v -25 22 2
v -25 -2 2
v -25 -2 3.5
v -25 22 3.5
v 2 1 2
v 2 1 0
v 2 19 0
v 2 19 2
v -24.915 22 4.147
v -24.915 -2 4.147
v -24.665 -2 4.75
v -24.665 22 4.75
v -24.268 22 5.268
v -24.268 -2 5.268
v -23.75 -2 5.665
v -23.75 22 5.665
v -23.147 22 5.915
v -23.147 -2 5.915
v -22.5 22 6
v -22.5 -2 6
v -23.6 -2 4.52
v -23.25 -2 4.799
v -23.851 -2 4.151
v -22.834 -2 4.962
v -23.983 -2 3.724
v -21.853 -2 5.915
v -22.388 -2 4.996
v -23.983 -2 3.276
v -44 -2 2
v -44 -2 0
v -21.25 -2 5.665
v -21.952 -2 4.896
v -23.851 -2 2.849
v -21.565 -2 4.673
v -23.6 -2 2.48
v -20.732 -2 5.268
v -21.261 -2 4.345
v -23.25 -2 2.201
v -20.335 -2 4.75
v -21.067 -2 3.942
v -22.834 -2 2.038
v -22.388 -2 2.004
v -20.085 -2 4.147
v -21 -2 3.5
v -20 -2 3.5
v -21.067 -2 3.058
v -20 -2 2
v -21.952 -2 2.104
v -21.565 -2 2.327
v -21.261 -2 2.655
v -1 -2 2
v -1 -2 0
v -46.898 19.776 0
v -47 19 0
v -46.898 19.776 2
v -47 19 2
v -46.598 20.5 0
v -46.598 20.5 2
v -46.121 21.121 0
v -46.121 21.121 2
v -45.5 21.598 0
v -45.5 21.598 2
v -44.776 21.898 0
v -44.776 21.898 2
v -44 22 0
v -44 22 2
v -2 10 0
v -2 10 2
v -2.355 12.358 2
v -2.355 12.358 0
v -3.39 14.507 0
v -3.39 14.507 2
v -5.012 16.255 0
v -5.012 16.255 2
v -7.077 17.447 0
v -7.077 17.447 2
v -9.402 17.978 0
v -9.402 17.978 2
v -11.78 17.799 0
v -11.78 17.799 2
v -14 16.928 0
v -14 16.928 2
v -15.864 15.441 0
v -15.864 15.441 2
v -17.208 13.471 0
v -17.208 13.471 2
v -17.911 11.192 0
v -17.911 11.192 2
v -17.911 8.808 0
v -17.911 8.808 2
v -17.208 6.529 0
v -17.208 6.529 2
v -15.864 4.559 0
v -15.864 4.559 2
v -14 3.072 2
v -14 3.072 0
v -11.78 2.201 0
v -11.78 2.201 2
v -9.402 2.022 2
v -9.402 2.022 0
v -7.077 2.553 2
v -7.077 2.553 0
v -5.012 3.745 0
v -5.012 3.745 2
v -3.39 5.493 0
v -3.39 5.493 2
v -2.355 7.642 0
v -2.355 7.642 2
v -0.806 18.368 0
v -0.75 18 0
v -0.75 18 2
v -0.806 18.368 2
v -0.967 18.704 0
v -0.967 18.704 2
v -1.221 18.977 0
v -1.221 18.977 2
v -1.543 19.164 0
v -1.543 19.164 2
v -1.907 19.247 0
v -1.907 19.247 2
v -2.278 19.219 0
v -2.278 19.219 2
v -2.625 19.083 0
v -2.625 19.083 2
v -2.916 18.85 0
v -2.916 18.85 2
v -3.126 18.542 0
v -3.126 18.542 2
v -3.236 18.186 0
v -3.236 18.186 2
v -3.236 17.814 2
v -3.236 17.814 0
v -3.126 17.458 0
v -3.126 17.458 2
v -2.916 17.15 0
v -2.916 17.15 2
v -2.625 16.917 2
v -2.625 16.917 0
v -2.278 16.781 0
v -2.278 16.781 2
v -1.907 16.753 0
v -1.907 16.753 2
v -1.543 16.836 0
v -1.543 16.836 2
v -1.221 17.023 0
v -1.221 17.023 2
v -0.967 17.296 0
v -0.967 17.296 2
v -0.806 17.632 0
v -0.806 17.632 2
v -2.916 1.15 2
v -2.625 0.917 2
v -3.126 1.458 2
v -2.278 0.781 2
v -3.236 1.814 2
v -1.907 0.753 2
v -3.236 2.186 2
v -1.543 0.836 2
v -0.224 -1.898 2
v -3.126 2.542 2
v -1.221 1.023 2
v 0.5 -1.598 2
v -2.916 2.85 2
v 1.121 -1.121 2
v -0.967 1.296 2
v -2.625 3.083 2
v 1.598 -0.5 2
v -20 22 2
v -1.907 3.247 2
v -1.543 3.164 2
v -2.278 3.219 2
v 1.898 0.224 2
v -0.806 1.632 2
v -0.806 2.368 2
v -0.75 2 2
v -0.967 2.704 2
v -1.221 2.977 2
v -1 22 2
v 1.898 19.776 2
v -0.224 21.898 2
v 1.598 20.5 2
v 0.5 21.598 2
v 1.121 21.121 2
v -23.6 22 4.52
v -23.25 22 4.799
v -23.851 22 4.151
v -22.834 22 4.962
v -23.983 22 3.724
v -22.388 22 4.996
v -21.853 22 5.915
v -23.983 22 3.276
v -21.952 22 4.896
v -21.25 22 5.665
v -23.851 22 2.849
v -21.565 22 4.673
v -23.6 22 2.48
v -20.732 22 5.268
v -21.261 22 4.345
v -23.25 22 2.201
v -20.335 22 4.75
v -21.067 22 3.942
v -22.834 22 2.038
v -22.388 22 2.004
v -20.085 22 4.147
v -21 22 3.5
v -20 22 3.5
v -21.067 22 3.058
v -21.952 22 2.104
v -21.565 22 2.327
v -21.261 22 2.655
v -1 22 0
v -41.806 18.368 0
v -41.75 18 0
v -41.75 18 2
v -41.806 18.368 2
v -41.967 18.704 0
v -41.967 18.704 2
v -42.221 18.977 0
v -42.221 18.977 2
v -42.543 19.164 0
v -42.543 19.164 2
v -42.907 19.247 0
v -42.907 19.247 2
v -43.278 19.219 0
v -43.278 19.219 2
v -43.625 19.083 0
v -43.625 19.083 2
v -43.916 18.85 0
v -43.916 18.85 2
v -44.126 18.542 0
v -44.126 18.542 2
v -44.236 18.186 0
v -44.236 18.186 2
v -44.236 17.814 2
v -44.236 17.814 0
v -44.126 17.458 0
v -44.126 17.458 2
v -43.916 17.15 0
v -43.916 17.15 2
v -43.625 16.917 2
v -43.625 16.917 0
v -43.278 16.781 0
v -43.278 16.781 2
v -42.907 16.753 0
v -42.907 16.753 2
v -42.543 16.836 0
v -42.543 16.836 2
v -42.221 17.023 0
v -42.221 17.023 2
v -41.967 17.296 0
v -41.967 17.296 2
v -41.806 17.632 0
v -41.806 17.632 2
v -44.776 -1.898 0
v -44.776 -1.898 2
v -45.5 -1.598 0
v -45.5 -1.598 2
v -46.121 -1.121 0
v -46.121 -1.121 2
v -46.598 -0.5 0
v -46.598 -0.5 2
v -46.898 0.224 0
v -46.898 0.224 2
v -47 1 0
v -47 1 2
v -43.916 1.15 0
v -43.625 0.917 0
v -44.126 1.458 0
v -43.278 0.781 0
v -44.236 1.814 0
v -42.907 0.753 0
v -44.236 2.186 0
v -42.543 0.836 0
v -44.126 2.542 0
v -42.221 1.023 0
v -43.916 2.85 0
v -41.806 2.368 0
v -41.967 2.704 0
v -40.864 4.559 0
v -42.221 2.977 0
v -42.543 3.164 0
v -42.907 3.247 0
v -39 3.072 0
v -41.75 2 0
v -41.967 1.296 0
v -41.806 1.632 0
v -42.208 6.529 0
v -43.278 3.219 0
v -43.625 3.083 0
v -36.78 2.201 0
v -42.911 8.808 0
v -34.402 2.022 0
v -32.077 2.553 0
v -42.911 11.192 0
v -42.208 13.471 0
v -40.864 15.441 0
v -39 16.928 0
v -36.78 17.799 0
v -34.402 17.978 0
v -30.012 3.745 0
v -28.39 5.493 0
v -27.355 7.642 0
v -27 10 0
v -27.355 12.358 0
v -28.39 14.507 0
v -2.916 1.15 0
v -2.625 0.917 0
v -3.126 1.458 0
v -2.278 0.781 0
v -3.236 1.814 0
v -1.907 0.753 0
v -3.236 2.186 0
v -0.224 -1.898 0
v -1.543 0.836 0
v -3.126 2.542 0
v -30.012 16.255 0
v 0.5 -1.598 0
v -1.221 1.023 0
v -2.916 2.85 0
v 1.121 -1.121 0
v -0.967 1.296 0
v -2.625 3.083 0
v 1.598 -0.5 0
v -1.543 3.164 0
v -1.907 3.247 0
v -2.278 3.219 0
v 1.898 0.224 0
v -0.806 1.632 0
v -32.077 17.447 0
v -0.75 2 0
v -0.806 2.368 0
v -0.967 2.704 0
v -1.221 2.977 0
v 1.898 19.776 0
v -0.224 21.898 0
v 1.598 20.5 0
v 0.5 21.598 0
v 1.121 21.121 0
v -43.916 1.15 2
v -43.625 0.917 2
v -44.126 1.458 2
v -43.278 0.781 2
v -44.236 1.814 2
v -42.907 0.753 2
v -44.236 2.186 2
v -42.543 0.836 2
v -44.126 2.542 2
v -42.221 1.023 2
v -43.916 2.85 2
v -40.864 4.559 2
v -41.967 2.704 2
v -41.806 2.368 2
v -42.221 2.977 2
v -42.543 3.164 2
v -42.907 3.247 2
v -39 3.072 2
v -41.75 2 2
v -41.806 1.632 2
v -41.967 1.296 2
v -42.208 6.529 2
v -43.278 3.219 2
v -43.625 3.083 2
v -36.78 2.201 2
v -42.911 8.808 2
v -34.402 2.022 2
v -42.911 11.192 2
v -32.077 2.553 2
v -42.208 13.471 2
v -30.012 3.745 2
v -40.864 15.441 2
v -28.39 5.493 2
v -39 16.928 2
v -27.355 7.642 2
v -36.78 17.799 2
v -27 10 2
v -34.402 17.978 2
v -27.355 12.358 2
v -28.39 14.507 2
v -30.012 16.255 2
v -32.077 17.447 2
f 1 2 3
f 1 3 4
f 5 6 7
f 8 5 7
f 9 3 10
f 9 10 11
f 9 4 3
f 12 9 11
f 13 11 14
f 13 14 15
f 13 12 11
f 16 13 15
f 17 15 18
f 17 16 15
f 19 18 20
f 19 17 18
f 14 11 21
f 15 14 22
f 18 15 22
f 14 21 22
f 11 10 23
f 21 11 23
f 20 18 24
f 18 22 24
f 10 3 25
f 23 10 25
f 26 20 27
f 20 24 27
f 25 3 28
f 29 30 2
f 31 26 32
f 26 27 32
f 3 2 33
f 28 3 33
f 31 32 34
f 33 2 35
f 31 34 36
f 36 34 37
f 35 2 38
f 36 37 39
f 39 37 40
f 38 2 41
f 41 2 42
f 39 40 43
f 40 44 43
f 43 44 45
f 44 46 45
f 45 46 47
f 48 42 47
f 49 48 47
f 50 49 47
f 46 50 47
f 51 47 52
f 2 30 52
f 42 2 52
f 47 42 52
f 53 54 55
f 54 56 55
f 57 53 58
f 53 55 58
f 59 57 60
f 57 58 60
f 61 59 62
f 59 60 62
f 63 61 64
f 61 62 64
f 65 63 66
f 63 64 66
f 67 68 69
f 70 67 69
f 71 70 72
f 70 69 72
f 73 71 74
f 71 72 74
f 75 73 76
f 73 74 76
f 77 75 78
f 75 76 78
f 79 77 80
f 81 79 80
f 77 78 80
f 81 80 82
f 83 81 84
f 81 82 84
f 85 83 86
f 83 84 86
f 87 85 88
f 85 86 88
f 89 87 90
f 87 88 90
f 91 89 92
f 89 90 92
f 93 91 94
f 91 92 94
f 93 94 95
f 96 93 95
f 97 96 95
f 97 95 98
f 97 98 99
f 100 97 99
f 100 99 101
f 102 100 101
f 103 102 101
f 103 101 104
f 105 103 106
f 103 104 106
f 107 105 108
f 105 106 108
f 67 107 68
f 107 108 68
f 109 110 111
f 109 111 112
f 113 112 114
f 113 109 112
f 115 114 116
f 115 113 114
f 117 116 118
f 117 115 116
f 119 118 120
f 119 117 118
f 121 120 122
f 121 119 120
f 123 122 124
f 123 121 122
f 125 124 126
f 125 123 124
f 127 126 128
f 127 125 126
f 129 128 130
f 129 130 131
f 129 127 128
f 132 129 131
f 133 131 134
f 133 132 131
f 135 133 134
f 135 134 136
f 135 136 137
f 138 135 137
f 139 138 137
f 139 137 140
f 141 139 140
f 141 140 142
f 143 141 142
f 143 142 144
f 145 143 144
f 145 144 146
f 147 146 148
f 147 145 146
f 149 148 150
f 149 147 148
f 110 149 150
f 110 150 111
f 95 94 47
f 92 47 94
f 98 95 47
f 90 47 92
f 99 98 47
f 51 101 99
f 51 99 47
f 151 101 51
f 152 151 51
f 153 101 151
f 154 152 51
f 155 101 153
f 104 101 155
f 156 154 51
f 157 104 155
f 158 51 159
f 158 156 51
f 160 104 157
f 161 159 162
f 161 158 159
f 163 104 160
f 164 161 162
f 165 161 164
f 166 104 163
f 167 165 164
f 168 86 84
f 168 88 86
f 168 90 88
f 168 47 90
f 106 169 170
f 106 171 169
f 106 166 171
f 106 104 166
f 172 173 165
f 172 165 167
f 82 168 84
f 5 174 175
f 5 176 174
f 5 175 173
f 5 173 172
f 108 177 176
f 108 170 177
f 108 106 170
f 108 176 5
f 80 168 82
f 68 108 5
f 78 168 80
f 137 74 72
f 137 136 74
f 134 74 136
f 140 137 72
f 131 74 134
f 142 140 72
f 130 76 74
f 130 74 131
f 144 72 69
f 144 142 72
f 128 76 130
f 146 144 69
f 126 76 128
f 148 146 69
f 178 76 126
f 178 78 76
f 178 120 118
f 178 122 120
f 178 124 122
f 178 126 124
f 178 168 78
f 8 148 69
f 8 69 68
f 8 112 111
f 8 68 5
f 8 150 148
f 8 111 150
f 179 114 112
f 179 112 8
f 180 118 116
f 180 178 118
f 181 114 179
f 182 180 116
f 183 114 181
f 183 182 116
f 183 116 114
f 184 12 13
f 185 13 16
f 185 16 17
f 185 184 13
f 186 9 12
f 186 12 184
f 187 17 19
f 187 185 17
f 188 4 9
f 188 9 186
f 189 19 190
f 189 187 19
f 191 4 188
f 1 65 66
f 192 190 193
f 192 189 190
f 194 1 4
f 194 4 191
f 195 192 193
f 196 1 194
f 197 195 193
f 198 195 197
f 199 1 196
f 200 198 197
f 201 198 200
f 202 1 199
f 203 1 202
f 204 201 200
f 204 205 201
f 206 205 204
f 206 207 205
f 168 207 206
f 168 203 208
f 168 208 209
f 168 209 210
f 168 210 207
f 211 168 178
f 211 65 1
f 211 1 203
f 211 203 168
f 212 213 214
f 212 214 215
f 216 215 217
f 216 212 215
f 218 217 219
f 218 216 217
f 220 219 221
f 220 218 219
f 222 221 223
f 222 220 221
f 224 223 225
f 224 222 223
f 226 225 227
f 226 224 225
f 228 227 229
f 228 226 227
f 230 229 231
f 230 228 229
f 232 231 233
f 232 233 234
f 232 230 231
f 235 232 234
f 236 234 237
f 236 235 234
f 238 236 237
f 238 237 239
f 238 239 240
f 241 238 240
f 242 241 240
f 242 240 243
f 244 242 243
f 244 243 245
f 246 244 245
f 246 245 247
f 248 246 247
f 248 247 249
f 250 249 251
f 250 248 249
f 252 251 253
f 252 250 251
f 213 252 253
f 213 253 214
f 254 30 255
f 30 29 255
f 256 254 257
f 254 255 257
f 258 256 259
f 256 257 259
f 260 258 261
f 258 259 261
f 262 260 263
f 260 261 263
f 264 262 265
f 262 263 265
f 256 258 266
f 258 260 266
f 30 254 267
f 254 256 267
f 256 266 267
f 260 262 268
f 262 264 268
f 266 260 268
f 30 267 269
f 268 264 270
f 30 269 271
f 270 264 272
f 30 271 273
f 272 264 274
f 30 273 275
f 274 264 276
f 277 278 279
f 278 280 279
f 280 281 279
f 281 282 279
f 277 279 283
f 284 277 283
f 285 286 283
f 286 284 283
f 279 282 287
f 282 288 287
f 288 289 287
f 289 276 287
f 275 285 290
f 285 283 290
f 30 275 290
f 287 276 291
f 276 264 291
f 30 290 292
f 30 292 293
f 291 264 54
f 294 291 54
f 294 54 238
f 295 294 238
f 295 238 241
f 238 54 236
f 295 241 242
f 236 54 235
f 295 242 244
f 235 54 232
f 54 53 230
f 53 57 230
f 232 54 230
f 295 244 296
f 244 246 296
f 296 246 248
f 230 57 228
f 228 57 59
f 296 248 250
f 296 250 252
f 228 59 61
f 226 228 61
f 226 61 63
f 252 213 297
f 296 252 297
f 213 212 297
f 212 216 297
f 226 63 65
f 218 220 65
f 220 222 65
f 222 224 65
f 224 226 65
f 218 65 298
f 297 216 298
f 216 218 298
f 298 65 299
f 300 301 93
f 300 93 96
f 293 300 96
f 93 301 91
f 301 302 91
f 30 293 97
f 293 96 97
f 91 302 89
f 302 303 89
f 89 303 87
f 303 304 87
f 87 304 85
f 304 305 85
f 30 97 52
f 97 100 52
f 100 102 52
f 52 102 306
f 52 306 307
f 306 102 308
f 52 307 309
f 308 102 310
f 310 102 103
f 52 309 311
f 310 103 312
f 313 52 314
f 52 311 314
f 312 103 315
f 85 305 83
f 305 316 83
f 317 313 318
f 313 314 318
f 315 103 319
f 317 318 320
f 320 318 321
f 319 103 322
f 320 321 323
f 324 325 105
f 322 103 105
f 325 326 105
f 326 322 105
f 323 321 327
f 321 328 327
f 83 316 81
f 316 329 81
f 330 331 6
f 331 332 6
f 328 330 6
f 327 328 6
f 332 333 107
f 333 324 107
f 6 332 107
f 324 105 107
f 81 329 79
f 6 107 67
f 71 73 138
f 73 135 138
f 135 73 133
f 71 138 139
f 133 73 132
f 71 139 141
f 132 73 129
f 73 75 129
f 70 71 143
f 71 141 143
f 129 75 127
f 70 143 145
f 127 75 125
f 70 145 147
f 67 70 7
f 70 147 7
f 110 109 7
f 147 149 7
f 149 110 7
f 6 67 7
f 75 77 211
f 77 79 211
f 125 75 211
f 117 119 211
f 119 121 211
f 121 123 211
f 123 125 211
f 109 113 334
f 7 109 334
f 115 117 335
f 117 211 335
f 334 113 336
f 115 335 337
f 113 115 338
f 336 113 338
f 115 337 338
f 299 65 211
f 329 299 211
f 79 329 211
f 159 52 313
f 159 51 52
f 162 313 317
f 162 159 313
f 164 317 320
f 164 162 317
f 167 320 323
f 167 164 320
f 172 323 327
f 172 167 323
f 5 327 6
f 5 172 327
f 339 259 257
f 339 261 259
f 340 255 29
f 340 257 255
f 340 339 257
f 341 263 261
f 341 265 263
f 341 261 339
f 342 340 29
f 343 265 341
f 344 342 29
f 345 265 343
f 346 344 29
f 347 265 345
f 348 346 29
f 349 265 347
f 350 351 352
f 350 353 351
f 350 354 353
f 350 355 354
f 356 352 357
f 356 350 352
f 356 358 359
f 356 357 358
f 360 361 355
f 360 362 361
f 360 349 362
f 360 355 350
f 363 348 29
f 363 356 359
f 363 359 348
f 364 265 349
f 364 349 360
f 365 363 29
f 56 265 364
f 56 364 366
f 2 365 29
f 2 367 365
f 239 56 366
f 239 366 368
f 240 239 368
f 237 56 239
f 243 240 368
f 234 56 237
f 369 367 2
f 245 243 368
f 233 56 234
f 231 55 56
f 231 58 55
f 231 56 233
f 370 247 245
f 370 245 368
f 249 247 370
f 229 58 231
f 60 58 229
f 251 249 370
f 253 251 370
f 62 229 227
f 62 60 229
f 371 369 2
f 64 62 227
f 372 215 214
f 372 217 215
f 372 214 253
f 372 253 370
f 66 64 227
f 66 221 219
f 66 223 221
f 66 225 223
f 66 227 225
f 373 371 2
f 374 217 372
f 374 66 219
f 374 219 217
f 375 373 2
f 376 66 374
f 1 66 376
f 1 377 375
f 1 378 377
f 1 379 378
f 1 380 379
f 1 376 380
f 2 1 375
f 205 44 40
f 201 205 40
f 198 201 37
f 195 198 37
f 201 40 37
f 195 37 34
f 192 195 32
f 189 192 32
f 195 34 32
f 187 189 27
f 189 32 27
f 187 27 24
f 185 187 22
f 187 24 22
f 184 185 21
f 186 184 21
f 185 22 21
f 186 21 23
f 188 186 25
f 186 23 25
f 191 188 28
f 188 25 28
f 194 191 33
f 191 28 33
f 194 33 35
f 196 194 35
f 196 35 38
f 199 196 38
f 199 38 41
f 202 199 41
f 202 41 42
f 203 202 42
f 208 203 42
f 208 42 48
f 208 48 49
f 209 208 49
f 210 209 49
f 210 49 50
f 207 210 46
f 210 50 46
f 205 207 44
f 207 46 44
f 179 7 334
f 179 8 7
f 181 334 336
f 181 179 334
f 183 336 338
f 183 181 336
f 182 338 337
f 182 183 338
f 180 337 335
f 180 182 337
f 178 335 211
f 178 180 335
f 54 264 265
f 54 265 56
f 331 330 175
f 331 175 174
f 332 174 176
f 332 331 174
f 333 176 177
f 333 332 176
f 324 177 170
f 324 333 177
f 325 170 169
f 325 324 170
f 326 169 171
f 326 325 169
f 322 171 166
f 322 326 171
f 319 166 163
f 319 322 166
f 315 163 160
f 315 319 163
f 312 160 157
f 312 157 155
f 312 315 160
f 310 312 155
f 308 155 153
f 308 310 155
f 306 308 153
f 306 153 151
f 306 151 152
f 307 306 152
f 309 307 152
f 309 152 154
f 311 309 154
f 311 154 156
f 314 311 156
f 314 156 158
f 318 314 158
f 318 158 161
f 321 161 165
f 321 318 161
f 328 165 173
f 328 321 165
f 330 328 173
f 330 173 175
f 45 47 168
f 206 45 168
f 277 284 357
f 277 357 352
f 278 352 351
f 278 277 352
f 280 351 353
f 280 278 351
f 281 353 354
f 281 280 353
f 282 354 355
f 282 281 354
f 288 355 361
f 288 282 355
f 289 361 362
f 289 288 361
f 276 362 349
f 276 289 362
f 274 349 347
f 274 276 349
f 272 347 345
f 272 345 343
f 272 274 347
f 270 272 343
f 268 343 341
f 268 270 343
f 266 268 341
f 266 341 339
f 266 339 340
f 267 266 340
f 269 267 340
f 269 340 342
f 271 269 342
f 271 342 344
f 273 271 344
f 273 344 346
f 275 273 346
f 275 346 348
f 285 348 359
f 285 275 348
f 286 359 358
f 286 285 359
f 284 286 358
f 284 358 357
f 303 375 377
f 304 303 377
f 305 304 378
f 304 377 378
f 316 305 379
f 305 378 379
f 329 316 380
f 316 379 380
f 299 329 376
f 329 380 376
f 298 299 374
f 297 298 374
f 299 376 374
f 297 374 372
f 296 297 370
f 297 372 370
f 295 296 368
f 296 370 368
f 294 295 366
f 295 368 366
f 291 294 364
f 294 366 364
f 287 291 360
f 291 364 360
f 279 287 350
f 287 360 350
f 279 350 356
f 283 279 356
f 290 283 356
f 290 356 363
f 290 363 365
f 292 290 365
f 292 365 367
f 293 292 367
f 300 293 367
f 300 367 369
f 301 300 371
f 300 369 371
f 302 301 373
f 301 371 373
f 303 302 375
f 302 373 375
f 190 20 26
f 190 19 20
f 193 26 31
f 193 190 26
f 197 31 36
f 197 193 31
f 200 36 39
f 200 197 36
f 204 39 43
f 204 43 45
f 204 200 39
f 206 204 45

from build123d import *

# Parameters (mm, degrees)
F1_W      = 49
F1_H      = 24
F1_R      = 1.25
F2_DEPTH  = 2
F3_W      = 5
F3_H      = 24
F4_DEPTH  = 4
F5_R      = 1.5
F6_DEPTH  = 24
F7_R      = 2.49999
F8_R      = 3
F9_R      = 8
F10_DEPTH = 2


# Not quite as in the source:
# - a fillet or chamfer is up to 0.001 mm smaller than in the source, because OpenCascade refuses the exact size


with BuildPart() as f2:
    # F1 (on Top) → F2 (new body)
    with BuildSketch(Plane.XY):
        with Locations((-22.5, 10)):
            Rectangle(F1_W, F1_H)
        with Locations((-43, 2)):
            Circle(F1_R, mode=Mode.SUBTRACT)
        with Locations((-2, 2)):
            Circle(F1_R, mode=Mode.SUBTRACT)
        with Locations((-43, 18)):
            Circle(F1_R, mode=Mode.SUBTRACT)
        with Locations((-2, 18)):
            Circle(F1_R, mode=Mode.SUBTRACT)
    extrude(amount=F2_DEPTH)

    # F3 (on face) → F4 (join)
    with BuildSketch(Plane.XY.offset(2)):
        with Locations((-22.5, 10)):
            Rectangle(F3_W, F3_H)
    extrude(amount=F4_DEPTH)

    # F5 (on face) → F6 (cut, through all)
    with BuildSketch(Plane.XZ.offset(2)):
        with Locations((-22.5, 3.5)):
            Circle(F5_R)
    extrude(amount=-F6_DEPTH, mode=Mode.SUBTRACT)

    # F7 (radius 2.5 in the source; OpenCascade refuses exactly that, so slightly less here)
    f7_edges = [f2.edges().sort_by_distance(p)[0] for p in [
        (-20, 10, 6),
        (-25, 10, 6),
    ]]
    fillet(f7_edges, radius=F7_R)

    # F8
    f8_edges = [f2.edges().sort_by_distance(p)[0] for p in [
        (2, -2, 1),
        (2, 22, 1),
        (-47, 22, 1),
        (-47, -2, 1),
    ]]
    fillet(f8_edges, radius=F8_R)

    # F9 (on face) → F10 (cut, through all)
    with BuildSketch(Plane.XY.offset(2)):
        with Locations((-35, 10)):
            Circle(F9_R)
        with Locations((-10, 10)):
            Circle(F9_R)
    extrude(amount=-F10_DEPTH, mode=Mode.SUBTRACT)


solid = f2.part
